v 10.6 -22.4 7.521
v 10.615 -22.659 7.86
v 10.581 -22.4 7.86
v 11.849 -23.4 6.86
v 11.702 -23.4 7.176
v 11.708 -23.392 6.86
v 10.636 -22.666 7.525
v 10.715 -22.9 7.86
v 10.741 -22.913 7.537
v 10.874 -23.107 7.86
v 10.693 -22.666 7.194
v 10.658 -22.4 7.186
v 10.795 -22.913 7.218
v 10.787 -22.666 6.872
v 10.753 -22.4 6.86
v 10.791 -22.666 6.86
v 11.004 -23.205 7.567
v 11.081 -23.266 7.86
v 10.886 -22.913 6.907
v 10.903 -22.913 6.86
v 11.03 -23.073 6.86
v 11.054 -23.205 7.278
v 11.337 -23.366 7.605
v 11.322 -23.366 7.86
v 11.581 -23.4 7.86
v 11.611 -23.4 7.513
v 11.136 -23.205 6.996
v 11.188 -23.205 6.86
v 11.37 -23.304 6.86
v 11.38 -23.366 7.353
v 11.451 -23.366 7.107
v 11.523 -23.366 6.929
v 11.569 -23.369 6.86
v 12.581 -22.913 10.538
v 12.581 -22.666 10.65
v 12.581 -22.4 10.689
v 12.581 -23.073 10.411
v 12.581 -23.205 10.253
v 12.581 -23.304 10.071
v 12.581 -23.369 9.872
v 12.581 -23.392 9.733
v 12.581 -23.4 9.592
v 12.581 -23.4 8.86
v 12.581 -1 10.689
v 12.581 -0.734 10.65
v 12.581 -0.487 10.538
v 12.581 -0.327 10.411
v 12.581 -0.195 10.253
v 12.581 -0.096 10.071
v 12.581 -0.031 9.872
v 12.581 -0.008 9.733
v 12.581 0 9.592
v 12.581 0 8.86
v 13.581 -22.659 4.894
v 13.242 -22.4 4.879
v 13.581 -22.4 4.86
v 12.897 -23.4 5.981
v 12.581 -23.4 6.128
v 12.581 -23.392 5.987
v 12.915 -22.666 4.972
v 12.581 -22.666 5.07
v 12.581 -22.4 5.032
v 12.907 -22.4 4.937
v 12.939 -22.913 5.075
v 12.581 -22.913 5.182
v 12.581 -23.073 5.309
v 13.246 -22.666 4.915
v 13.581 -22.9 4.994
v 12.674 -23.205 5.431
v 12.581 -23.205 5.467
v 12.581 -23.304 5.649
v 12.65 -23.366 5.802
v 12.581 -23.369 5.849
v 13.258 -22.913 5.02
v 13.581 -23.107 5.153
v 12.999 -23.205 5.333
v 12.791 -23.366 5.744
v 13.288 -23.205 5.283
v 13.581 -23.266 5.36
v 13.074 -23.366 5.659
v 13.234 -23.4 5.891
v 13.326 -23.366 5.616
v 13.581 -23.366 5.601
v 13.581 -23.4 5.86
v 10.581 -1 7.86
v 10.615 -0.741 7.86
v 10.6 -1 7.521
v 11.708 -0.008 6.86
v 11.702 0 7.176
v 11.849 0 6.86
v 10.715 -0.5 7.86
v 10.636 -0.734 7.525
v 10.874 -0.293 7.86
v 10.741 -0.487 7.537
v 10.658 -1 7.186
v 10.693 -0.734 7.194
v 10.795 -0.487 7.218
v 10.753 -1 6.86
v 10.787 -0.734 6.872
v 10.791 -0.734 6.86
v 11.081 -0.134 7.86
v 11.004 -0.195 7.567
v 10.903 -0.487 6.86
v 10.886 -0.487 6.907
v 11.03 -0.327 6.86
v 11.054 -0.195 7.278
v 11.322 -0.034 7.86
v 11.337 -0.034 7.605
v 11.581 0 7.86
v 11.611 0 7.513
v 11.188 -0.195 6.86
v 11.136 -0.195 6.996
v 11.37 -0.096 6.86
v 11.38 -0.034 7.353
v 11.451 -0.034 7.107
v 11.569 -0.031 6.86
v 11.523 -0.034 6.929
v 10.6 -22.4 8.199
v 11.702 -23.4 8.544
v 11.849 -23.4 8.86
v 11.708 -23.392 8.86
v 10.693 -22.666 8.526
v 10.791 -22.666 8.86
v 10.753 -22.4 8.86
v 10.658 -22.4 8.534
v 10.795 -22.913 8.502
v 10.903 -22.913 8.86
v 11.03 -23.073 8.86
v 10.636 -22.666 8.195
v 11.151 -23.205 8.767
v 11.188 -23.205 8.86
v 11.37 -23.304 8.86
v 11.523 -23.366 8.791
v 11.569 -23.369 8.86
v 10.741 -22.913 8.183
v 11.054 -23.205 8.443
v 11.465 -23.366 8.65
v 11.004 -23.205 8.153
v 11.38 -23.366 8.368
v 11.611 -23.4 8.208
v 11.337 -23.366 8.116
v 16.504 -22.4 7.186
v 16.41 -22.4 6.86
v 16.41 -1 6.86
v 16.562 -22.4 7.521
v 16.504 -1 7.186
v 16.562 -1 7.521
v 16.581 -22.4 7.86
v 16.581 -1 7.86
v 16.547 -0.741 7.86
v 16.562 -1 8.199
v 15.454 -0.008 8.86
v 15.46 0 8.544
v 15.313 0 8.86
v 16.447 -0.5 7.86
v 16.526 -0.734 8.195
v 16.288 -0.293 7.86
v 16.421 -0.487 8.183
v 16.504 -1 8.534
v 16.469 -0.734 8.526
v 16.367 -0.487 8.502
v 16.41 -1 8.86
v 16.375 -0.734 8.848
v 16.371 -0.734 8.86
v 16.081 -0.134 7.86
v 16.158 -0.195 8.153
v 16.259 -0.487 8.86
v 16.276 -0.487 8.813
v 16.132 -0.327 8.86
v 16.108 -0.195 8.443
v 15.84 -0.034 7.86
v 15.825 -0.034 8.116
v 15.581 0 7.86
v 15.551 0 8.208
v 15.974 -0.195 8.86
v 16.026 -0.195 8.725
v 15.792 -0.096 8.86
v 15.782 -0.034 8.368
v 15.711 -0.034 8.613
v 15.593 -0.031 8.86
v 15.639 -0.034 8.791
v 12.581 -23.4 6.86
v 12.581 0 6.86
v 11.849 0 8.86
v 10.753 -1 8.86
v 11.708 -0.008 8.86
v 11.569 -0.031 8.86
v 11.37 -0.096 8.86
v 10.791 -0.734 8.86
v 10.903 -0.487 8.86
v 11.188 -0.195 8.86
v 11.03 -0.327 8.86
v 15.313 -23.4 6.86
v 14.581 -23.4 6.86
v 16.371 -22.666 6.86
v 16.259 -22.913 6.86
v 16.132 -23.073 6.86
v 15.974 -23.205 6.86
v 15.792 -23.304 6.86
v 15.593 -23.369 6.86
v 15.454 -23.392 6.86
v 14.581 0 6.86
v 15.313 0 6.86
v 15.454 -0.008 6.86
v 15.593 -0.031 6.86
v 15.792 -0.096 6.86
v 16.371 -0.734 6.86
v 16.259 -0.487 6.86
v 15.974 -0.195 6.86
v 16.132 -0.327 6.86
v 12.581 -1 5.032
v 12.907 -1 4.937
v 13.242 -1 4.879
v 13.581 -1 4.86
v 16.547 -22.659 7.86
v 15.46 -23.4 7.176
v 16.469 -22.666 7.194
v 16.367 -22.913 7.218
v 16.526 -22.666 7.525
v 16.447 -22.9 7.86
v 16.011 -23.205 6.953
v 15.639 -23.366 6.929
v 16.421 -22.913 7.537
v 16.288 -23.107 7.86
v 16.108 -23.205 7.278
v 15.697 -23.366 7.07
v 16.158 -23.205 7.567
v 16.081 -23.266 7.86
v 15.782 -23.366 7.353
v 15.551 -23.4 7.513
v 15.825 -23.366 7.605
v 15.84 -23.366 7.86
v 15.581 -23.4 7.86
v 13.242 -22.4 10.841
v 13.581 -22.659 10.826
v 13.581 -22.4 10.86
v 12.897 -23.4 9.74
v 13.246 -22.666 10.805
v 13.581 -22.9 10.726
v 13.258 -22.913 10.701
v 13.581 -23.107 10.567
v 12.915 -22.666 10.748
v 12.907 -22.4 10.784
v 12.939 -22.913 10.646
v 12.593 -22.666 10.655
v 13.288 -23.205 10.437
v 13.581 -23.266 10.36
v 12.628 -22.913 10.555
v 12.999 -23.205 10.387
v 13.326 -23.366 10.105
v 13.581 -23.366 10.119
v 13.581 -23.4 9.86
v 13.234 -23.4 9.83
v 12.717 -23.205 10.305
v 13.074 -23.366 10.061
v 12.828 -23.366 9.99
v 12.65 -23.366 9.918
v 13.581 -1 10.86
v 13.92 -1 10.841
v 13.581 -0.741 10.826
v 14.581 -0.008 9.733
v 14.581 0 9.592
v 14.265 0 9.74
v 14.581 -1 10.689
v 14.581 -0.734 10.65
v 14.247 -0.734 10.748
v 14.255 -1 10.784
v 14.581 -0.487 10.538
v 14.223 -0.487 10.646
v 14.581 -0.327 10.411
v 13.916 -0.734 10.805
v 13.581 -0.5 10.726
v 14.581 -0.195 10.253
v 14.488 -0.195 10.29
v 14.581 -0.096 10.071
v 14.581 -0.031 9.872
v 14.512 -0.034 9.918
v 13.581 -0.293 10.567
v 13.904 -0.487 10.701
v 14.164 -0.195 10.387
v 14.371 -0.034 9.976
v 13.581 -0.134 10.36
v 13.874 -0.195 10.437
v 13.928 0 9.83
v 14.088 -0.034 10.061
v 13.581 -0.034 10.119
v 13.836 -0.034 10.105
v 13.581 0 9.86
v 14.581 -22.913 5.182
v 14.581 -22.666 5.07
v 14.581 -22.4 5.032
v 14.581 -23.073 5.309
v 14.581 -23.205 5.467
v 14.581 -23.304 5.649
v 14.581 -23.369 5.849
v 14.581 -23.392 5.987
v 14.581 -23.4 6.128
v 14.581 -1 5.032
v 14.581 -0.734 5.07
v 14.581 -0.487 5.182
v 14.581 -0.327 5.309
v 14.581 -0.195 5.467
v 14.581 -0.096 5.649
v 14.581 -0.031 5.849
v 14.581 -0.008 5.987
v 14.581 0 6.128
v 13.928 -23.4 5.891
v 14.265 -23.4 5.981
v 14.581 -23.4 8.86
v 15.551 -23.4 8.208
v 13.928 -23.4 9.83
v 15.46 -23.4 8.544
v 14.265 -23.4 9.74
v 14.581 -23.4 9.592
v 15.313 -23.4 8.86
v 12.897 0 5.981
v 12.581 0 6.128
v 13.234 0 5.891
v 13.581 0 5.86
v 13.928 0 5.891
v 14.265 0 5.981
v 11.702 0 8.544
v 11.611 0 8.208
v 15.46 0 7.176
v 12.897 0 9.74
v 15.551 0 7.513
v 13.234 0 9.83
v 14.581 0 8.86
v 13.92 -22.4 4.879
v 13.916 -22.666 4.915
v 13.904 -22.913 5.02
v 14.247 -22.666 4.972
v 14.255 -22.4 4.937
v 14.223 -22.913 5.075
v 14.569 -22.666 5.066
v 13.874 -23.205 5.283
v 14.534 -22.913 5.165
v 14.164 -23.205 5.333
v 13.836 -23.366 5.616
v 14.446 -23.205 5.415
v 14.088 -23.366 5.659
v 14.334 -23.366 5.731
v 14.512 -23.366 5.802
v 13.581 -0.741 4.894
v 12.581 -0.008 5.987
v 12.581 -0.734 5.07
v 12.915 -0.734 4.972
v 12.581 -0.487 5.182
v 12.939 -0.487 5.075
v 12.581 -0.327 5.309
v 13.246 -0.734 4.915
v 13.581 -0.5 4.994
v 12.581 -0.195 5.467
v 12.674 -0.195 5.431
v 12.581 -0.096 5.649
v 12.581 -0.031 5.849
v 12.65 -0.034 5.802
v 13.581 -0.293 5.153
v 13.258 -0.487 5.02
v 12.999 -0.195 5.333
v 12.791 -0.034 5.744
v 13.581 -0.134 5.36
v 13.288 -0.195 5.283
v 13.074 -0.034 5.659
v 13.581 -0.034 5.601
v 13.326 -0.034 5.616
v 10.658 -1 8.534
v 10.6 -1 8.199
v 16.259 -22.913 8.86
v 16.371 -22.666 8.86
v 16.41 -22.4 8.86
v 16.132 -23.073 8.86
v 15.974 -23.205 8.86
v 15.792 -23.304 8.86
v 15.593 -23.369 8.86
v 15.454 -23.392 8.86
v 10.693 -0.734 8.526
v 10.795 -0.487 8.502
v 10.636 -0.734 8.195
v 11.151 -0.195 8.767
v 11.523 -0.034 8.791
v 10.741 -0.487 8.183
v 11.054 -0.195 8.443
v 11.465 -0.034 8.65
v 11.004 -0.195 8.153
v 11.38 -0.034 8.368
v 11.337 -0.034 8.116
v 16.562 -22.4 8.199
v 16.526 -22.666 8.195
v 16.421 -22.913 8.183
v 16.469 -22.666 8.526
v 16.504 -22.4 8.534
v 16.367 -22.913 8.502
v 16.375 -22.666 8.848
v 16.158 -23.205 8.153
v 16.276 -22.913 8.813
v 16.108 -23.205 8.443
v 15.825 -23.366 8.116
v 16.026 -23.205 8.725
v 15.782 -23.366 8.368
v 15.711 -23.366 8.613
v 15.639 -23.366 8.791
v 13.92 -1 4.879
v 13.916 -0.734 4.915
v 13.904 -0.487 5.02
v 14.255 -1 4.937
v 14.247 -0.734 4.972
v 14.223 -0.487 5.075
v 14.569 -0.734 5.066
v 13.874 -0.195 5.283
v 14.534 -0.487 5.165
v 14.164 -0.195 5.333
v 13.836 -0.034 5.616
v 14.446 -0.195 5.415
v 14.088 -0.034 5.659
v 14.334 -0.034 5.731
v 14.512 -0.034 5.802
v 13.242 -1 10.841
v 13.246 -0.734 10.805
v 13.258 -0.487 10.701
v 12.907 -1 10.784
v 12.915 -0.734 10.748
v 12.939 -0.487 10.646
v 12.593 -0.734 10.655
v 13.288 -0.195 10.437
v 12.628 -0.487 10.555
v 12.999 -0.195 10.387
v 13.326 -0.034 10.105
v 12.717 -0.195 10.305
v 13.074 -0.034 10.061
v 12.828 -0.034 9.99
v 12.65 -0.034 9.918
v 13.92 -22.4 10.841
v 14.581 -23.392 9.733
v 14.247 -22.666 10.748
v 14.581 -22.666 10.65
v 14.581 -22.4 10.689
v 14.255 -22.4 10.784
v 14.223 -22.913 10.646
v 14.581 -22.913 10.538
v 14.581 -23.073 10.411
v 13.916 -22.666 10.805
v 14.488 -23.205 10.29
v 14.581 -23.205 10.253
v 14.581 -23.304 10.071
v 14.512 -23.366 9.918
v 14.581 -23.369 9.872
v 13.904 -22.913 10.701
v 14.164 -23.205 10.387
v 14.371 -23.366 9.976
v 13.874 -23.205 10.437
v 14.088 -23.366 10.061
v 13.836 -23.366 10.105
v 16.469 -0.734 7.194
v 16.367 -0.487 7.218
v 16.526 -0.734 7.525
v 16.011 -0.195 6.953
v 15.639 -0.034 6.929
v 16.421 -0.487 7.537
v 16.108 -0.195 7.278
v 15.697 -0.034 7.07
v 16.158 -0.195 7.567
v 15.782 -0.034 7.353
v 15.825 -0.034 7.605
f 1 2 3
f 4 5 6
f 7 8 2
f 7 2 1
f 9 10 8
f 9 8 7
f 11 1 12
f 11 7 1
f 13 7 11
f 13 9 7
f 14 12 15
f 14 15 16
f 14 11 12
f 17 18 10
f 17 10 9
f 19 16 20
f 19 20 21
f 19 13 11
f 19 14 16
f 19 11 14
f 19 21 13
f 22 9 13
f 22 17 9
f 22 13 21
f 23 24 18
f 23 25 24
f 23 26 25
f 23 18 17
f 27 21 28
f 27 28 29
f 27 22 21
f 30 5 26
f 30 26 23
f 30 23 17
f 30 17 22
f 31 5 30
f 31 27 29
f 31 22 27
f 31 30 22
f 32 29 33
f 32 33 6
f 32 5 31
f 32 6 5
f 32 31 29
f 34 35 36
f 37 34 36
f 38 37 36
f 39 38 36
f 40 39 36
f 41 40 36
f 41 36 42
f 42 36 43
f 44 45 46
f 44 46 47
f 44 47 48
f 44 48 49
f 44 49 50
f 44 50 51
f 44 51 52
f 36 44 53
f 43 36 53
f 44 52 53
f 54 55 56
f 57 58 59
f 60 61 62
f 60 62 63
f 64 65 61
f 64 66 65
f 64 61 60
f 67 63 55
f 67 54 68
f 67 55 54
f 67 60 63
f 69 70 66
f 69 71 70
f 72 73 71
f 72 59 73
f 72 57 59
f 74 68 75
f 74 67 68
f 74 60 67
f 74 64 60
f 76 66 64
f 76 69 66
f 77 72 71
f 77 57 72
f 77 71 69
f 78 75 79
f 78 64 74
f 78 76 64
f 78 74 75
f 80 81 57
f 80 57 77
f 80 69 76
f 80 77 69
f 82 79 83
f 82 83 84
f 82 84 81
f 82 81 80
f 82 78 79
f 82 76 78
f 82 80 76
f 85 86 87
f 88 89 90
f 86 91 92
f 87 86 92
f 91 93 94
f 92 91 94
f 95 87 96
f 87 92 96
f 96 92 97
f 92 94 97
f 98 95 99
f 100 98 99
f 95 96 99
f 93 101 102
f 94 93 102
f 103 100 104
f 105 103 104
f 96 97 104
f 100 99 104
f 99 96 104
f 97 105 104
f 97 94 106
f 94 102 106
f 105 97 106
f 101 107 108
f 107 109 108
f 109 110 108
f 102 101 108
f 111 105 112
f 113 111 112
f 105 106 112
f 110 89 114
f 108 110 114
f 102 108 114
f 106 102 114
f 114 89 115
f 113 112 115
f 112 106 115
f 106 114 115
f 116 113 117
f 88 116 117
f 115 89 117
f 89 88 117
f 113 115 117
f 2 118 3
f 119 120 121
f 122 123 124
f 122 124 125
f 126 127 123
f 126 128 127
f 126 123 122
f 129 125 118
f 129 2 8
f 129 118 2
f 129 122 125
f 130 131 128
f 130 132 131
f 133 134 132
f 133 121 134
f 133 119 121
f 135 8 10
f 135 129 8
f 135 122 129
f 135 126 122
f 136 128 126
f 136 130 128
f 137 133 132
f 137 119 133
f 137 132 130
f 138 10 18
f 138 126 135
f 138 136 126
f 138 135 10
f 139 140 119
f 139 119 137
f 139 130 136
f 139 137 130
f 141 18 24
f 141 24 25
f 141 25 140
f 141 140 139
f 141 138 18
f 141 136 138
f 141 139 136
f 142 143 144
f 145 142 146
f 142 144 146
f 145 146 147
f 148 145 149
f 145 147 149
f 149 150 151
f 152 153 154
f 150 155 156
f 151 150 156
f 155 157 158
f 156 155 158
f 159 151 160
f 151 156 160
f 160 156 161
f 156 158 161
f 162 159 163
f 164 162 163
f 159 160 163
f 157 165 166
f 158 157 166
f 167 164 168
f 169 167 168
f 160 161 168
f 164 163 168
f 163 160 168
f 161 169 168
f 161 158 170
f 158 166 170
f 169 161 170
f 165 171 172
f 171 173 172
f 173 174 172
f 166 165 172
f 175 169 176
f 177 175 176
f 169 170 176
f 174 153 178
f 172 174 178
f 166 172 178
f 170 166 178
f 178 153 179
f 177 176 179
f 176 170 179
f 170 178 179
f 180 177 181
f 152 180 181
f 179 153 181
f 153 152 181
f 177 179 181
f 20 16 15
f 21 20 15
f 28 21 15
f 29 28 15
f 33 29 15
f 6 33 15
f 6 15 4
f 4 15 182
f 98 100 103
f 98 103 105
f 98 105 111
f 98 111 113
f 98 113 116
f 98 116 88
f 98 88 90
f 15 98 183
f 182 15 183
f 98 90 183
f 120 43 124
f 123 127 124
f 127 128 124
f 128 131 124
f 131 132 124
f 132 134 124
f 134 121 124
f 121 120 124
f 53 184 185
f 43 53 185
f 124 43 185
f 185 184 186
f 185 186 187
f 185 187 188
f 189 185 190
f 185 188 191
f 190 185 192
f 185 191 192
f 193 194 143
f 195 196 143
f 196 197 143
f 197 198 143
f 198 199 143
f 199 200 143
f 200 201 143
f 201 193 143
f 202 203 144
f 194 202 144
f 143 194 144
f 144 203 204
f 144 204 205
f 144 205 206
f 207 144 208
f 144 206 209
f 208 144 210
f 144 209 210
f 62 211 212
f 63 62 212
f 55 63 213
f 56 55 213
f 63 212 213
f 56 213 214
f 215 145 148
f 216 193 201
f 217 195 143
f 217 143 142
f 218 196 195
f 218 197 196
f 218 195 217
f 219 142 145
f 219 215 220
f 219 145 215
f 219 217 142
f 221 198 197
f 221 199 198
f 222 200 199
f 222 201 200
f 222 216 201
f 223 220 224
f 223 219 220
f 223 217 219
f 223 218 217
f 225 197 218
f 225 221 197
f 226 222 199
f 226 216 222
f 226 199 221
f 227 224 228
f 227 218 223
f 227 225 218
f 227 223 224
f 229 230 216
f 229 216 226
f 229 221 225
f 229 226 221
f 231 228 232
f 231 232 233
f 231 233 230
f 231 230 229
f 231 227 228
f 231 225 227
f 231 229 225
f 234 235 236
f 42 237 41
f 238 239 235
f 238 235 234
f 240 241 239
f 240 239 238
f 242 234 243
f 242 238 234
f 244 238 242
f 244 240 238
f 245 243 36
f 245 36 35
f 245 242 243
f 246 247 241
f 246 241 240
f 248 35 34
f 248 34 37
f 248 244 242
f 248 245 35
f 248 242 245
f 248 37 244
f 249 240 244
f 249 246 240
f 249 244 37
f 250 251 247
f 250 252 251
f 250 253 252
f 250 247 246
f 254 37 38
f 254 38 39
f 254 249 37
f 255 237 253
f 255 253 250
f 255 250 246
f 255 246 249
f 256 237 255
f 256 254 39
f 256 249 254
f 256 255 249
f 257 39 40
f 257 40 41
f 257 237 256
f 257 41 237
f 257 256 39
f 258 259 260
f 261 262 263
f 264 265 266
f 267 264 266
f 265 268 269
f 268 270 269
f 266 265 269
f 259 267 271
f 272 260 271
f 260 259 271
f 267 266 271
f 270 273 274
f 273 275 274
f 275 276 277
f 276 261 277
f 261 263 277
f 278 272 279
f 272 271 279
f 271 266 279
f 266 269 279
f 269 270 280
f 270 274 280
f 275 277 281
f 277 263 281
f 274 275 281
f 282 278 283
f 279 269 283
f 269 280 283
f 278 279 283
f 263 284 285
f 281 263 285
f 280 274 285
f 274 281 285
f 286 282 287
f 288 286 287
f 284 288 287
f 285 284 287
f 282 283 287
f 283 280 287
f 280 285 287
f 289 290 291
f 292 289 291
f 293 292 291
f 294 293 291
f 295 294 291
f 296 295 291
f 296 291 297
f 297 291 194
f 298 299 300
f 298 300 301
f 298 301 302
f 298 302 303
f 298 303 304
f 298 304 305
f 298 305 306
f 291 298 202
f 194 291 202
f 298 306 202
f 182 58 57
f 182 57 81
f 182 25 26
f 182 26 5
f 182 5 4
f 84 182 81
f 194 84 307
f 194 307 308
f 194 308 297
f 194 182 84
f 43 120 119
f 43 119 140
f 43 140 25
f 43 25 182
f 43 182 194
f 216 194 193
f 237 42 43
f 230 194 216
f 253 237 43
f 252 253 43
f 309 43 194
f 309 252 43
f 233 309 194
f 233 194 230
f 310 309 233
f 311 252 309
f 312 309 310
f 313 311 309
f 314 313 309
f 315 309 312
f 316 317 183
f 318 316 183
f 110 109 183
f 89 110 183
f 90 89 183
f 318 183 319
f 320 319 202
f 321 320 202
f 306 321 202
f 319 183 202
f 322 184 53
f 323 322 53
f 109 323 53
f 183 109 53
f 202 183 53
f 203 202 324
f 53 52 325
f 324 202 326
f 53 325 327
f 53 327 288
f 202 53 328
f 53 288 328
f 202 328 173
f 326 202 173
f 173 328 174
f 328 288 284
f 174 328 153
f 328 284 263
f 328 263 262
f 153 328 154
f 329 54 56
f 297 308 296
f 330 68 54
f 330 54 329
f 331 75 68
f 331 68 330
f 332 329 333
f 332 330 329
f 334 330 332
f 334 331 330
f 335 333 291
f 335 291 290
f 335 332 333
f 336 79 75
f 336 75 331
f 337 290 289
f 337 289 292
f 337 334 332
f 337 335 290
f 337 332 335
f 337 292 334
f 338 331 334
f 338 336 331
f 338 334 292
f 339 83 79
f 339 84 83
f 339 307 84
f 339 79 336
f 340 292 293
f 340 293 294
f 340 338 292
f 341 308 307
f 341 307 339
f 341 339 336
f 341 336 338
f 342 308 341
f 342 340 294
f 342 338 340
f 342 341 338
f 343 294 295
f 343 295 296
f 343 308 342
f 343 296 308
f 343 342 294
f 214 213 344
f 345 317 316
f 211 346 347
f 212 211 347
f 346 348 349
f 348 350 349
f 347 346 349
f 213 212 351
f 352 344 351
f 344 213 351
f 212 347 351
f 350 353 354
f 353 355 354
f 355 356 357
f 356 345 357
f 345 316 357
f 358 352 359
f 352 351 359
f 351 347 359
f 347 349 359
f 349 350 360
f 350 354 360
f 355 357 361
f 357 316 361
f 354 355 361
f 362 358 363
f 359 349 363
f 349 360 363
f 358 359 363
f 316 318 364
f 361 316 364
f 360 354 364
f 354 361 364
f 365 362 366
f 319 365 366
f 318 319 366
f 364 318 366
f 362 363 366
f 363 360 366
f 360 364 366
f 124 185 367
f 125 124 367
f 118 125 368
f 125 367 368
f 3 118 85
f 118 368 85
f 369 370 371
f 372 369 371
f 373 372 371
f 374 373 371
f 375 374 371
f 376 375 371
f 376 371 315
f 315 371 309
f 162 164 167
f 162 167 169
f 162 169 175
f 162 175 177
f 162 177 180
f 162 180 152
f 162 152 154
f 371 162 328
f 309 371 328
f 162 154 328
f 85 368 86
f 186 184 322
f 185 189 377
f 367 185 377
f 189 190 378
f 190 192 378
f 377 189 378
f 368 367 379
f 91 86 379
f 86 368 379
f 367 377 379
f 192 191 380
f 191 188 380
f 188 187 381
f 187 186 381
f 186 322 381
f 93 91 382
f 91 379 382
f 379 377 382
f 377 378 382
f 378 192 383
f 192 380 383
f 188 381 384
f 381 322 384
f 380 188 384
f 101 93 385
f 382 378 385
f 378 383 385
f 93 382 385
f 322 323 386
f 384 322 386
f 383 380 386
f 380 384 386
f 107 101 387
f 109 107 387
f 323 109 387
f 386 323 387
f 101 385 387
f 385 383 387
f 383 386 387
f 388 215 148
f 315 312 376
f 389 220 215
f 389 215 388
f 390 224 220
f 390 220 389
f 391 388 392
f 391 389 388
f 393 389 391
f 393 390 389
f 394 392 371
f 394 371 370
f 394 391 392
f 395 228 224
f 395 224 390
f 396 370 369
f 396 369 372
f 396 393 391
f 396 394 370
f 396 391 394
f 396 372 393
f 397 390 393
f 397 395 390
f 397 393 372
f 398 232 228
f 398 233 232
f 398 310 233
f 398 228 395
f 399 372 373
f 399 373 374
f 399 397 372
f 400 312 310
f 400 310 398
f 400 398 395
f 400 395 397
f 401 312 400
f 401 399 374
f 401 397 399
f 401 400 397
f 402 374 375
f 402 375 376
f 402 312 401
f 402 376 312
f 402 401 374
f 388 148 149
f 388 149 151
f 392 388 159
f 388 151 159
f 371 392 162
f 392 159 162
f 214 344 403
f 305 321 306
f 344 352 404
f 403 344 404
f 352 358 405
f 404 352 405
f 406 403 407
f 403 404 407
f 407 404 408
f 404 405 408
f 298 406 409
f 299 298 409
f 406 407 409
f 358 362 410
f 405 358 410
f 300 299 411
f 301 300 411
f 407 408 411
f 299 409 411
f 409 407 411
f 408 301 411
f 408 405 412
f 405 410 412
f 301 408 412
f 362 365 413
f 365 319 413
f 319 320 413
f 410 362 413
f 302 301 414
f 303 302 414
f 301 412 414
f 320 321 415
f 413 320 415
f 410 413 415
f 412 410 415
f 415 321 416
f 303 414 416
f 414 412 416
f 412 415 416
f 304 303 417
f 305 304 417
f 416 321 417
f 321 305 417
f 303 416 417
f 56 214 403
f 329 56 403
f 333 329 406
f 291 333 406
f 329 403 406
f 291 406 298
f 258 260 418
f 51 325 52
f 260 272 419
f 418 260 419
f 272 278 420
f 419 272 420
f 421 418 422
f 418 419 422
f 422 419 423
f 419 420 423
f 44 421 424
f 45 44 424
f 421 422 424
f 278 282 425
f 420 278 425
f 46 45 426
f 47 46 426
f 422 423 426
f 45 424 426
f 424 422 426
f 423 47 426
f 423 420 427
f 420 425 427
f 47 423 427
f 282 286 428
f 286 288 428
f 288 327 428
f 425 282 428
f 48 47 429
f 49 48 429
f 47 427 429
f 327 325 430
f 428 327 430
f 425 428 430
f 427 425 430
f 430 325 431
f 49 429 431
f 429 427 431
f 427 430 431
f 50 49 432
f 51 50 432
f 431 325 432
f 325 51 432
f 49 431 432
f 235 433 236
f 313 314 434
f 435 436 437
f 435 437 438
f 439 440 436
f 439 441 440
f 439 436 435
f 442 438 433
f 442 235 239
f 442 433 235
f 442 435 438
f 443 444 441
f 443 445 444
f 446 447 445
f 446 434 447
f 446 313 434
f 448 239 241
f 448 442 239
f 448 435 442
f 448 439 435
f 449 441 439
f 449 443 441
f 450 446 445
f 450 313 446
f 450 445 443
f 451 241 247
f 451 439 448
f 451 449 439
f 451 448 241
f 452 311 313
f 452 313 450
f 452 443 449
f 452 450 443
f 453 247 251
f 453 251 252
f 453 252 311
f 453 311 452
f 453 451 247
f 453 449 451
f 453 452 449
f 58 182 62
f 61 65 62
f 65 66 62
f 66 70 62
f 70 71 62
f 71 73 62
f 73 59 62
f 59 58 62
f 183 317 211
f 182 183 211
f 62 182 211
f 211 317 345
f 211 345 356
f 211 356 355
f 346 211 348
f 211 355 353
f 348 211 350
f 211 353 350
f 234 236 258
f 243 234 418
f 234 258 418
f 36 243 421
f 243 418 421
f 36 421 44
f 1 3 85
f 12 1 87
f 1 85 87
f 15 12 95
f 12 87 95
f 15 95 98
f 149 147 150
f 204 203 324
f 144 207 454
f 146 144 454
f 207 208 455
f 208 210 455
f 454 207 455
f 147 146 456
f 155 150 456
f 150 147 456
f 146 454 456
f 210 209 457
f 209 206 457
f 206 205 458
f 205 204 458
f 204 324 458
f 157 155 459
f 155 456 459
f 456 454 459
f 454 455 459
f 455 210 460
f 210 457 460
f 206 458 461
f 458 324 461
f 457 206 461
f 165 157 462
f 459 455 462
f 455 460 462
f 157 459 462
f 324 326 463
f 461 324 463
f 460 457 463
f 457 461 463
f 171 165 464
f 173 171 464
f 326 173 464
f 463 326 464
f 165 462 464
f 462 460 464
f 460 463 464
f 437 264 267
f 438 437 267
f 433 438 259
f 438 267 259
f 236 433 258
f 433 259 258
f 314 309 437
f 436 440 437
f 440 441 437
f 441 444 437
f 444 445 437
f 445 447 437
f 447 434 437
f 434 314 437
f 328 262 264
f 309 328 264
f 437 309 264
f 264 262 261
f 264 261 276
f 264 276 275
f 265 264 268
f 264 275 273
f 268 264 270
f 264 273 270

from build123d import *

# Parameters (mm, degrees)
F0_W     = 2
F0_H     = 2
F1_DEPTH = 23.4
F2_R     = 1


with BuildPart() as f1:
    # F0 (on Front) → F1 (new body)
    with BuildSketch(Plane.XZ):
        with BuildLine():
            Line((12.5810803622, 6.8602320091), (12.5810803622, 8.8602320091))
            Line((12.5810803622, 8.8602320091), (10.7526532375, 8.8602320091))
            ThreePointArc((10.7526532375, 8.8602320091), (10.6242846832, 8.3675379453), (10.5810803622, 7.8602320091))
            ThreePointArc((10.5810803622, 7.8602320091), (10.6242846832, 7.3529260729), (10.7526532375, 6.8602320091))
            Line((10.7526532375, 6.8602320091), (12.5810803622, 6.8602320091))
        make_face()
        with Locations((13.5810803622, 7.8602320091)):
            Rectangle(F0_W, F0_H)
        with BuildLine():
            Line((14.5810803622, 8.8602320091), (14.5810803622, 10.6886591338))
            ThreePointArc((14.5810803622, 10.6886591338), (14.0883862984, 10.8170276881), (13.5810803622, 10.8602320091))
            ThreePointArc((13.5810803622, 10.8602320091), (13.073774426, 10.8170276881), (12.5810803622, 10.6886591338))
            Line((12.5810803622, 10.6886591338), (12.5810803622, 8.8602320091))
            Line((12.5810803622, 8.8602320091), (14.5810803622, 8.8602320091))
        make_face()
        with BuildLine():
            ThreePointArc((13.5810803622, 4.8602320091), (14.0883862984, 4.9034363301), (14.5810803622, 5.0318048844))
            Line((14.5810803622, 5.0318048844), (14.5810803622, 6.8602320091))
            Line((14.5810803622, 6.8602320091), (12.5810803622, 6.8602320091))
            Line((12.5810803622, 6.8602320091), (12.5810803622, 5.0318048844))
            ThreePointArc((12.5810803622, 5.0318048844), (13.073774426, 4.9034363301), (13.5810803622, 4.8602320091))
        make_face()
        with BuildLine():
            ThreePointArc((16.4095074869, 6.8602320091), (16.5378760412, 7.3529260729), (16.5810803622, 7.8602320091))
            ThreePointArc((16.5810803622, 7.8602320091), (16.5378760412, 8.3675379453), (16.4095074869, 8.8602320091))
            Line((16.4095074869, 8.8602320091), (14.5810803622, 8.8602320091))
            Line((14.5810803622, 8.8602320091), (14.5810803622, 6.8602320091))
            Line((14.5810803622, 6.8602320091), (16.4095074869, 6.8602320091))
        make_face()
    extrude(amount=F1_DEPTH)

    # F2
    f2_edges = [f1.edges().sort_by_distance(p)[0] for p in [
        (16.58108, 0, 7.860232),
        (13.58108, 0, 10.860232),
        (10.58108, 0, 7.860232),
        (13.58108, 0, 4.860232),
        (13.58108, -23.4, 10.860232),
        (10.58108, -23.4, 7.860232),
        (13.58108, -23.4, 4.860232),
        (16.58108, -23.4, 7.860232),
    ]]
    fillet(f2_edges, radius=F2_R)


solid = f1.part
